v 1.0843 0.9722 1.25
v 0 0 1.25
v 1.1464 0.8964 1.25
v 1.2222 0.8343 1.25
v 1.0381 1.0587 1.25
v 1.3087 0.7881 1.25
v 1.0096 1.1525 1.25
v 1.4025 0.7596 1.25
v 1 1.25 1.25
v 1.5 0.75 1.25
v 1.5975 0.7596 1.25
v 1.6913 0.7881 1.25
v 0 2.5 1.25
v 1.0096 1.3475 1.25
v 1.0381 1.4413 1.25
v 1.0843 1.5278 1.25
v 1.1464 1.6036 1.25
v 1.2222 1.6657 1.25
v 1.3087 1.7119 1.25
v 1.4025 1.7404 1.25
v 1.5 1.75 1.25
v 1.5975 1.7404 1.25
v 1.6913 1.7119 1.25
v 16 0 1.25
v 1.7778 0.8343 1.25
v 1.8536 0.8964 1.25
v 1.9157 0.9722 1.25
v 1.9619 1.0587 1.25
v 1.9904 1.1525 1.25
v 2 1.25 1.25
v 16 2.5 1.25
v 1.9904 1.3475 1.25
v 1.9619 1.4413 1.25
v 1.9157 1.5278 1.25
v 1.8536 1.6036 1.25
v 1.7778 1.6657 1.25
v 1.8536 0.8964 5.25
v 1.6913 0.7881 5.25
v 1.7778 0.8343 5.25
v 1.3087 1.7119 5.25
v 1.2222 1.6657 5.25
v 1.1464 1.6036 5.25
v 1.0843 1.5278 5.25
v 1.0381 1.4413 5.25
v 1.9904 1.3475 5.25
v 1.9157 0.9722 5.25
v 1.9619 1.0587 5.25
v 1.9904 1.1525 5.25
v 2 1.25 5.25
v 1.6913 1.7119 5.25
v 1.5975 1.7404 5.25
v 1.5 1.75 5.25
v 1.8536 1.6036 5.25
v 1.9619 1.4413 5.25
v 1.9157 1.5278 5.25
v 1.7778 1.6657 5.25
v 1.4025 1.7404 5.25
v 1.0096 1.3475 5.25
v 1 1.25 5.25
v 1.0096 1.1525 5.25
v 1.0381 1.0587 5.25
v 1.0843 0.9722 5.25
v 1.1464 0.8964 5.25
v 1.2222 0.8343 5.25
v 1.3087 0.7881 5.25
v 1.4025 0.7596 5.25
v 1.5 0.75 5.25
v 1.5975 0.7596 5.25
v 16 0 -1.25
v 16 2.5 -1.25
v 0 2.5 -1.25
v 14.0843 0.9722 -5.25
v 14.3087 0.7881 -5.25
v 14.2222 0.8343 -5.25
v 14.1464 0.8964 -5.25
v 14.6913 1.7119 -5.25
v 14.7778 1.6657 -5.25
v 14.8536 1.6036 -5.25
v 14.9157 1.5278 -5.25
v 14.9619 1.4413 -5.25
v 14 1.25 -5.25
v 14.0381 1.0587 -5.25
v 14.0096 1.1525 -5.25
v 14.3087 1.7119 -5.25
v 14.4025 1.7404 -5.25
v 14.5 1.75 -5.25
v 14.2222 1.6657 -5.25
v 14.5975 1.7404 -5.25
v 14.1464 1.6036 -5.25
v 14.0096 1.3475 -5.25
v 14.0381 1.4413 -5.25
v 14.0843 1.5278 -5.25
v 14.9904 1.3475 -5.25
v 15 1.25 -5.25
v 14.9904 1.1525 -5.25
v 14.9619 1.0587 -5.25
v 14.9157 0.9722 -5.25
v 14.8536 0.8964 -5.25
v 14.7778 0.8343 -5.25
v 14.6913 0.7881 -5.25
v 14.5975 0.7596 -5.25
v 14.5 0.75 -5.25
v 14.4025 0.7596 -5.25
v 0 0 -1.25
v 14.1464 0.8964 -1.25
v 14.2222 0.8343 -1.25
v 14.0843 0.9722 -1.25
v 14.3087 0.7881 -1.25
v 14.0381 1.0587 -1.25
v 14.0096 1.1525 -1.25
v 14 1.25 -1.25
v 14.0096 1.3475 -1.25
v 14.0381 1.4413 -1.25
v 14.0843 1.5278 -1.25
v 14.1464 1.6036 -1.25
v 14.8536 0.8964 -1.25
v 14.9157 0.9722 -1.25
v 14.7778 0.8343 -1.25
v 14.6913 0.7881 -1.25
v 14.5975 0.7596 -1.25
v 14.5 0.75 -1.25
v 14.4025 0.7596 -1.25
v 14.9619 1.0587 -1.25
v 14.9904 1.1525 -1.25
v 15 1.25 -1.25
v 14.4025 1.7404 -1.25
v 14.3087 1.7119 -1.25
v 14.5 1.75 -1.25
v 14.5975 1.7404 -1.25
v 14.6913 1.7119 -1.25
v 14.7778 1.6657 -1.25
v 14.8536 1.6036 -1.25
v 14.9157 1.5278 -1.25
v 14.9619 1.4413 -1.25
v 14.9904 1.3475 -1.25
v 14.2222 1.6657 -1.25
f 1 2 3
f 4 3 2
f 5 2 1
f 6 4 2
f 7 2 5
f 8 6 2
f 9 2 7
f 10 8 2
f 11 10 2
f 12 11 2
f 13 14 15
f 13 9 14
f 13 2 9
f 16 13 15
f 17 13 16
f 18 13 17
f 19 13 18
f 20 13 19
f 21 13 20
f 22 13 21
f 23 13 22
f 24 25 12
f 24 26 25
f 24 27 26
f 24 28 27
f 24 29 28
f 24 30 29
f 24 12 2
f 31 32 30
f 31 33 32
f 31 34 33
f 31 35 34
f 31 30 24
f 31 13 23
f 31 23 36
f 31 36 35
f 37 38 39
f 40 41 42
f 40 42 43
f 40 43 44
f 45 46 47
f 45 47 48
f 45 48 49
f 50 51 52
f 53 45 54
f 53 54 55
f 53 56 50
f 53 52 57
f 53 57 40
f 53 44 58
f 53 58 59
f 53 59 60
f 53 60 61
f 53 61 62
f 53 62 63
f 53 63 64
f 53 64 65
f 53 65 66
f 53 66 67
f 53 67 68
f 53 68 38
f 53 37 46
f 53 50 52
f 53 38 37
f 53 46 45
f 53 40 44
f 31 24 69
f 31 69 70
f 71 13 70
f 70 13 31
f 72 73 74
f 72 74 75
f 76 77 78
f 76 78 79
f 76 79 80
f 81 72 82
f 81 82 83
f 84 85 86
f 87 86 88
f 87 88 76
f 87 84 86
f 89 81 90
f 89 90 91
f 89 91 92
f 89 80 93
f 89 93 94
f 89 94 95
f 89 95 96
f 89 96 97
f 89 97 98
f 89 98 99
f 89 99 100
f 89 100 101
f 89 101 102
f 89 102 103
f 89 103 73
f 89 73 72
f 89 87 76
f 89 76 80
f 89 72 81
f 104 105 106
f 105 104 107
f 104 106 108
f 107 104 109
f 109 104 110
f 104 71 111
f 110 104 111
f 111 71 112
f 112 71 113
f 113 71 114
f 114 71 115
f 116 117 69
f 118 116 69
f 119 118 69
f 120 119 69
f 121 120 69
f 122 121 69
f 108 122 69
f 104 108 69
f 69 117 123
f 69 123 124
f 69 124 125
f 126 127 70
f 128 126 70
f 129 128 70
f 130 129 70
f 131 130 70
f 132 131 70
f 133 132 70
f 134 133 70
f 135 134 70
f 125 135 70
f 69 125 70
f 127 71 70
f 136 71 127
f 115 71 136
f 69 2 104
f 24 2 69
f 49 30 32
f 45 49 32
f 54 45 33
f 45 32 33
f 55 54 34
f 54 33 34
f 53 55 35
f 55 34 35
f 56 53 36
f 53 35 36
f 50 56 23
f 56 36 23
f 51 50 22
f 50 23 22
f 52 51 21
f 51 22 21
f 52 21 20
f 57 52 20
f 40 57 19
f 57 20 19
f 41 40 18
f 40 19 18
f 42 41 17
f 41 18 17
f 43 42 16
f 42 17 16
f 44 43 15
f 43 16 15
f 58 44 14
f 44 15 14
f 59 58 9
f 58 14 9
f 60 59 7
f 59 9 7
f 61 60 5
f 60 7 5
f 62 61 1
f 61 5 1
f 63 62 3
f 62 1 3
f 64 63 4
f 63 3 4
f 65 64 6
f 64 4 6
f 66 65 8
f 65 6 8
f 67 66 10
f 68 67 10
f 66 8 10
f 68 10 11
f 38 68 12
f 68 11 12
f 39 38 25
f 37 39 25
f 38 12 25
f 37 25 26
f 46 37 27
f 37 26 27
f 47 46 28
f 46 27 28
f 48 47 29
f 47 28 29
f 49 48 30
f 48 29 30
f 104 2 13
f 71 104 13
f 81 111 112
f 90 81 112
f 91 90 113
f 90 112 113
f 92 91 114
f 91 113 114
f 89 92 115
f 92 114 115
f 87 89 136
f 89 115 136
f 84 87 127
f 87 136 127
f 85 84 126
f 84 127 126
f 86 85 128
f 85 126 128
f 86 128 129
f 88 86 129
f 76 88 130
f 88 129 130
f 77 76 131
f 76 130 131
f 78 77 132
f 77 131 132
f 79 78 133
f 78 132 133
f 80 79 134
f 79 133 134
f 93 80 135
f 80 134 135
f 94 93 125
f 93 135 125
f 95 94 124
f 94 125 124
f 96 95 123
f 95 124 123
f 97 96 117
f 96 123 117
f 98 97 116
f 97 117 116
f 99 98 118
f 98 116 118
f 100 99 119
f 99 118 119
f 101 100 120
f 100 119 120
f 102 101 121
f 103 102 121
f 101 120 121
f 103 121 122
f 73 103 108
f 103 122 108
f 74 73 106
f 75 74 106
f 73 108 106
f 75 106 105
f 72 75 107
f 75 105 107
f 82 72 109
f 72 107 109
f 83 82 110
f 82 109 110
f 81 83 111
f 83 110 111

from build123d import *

# Parameters (mm, degrees)
SKETCH1_W           = 16
SKETCH1_H           = 2.5
BOSS_EXTRUDE1_DEPTH = 1.25
SKETCH2_R           = 0.5
BOSS_EXTRUDE2_DEPTH = 4
SKETCH3_R           = 0.5
BOSS_EXTRUDE3_DEPTH = 4


with BuildPart() as part:
    # Sketch1 → Boss-Extrude1 (new body, symmetric)
    with BuildSketch(Plane.XY):
        with Locations((8, 1.25)):
            Rectangle(SKETCH1_W, SKETCH1_H)
    extrude(amount=BOSS_EXTRUDE1_DEPTH, both=True)

    # Sketch2 → Boss-Extrude2 (add)
    with BuildSketch(Plane.XY.offset(1.25)):
        with Locations((1.5, 1.25)):
            Circle(SKETCH2_R)
    extrude(amount=BOSS_EXTRUDE2_DEPTH)

    # Sketch3 → Boss-Extrude3 (add)
    with BuildSketch(Plane(origin=(0, 0, -1.25), x_dir=(-1, 0, 0), z_dir=(0, 0, -1))):
        with Locations((-14.5, 1.25)):
            Circle(SKETCH3_R)
    extrude(amount=BOSS_EXTRUDE3_DEPTH)


solid = part.part
